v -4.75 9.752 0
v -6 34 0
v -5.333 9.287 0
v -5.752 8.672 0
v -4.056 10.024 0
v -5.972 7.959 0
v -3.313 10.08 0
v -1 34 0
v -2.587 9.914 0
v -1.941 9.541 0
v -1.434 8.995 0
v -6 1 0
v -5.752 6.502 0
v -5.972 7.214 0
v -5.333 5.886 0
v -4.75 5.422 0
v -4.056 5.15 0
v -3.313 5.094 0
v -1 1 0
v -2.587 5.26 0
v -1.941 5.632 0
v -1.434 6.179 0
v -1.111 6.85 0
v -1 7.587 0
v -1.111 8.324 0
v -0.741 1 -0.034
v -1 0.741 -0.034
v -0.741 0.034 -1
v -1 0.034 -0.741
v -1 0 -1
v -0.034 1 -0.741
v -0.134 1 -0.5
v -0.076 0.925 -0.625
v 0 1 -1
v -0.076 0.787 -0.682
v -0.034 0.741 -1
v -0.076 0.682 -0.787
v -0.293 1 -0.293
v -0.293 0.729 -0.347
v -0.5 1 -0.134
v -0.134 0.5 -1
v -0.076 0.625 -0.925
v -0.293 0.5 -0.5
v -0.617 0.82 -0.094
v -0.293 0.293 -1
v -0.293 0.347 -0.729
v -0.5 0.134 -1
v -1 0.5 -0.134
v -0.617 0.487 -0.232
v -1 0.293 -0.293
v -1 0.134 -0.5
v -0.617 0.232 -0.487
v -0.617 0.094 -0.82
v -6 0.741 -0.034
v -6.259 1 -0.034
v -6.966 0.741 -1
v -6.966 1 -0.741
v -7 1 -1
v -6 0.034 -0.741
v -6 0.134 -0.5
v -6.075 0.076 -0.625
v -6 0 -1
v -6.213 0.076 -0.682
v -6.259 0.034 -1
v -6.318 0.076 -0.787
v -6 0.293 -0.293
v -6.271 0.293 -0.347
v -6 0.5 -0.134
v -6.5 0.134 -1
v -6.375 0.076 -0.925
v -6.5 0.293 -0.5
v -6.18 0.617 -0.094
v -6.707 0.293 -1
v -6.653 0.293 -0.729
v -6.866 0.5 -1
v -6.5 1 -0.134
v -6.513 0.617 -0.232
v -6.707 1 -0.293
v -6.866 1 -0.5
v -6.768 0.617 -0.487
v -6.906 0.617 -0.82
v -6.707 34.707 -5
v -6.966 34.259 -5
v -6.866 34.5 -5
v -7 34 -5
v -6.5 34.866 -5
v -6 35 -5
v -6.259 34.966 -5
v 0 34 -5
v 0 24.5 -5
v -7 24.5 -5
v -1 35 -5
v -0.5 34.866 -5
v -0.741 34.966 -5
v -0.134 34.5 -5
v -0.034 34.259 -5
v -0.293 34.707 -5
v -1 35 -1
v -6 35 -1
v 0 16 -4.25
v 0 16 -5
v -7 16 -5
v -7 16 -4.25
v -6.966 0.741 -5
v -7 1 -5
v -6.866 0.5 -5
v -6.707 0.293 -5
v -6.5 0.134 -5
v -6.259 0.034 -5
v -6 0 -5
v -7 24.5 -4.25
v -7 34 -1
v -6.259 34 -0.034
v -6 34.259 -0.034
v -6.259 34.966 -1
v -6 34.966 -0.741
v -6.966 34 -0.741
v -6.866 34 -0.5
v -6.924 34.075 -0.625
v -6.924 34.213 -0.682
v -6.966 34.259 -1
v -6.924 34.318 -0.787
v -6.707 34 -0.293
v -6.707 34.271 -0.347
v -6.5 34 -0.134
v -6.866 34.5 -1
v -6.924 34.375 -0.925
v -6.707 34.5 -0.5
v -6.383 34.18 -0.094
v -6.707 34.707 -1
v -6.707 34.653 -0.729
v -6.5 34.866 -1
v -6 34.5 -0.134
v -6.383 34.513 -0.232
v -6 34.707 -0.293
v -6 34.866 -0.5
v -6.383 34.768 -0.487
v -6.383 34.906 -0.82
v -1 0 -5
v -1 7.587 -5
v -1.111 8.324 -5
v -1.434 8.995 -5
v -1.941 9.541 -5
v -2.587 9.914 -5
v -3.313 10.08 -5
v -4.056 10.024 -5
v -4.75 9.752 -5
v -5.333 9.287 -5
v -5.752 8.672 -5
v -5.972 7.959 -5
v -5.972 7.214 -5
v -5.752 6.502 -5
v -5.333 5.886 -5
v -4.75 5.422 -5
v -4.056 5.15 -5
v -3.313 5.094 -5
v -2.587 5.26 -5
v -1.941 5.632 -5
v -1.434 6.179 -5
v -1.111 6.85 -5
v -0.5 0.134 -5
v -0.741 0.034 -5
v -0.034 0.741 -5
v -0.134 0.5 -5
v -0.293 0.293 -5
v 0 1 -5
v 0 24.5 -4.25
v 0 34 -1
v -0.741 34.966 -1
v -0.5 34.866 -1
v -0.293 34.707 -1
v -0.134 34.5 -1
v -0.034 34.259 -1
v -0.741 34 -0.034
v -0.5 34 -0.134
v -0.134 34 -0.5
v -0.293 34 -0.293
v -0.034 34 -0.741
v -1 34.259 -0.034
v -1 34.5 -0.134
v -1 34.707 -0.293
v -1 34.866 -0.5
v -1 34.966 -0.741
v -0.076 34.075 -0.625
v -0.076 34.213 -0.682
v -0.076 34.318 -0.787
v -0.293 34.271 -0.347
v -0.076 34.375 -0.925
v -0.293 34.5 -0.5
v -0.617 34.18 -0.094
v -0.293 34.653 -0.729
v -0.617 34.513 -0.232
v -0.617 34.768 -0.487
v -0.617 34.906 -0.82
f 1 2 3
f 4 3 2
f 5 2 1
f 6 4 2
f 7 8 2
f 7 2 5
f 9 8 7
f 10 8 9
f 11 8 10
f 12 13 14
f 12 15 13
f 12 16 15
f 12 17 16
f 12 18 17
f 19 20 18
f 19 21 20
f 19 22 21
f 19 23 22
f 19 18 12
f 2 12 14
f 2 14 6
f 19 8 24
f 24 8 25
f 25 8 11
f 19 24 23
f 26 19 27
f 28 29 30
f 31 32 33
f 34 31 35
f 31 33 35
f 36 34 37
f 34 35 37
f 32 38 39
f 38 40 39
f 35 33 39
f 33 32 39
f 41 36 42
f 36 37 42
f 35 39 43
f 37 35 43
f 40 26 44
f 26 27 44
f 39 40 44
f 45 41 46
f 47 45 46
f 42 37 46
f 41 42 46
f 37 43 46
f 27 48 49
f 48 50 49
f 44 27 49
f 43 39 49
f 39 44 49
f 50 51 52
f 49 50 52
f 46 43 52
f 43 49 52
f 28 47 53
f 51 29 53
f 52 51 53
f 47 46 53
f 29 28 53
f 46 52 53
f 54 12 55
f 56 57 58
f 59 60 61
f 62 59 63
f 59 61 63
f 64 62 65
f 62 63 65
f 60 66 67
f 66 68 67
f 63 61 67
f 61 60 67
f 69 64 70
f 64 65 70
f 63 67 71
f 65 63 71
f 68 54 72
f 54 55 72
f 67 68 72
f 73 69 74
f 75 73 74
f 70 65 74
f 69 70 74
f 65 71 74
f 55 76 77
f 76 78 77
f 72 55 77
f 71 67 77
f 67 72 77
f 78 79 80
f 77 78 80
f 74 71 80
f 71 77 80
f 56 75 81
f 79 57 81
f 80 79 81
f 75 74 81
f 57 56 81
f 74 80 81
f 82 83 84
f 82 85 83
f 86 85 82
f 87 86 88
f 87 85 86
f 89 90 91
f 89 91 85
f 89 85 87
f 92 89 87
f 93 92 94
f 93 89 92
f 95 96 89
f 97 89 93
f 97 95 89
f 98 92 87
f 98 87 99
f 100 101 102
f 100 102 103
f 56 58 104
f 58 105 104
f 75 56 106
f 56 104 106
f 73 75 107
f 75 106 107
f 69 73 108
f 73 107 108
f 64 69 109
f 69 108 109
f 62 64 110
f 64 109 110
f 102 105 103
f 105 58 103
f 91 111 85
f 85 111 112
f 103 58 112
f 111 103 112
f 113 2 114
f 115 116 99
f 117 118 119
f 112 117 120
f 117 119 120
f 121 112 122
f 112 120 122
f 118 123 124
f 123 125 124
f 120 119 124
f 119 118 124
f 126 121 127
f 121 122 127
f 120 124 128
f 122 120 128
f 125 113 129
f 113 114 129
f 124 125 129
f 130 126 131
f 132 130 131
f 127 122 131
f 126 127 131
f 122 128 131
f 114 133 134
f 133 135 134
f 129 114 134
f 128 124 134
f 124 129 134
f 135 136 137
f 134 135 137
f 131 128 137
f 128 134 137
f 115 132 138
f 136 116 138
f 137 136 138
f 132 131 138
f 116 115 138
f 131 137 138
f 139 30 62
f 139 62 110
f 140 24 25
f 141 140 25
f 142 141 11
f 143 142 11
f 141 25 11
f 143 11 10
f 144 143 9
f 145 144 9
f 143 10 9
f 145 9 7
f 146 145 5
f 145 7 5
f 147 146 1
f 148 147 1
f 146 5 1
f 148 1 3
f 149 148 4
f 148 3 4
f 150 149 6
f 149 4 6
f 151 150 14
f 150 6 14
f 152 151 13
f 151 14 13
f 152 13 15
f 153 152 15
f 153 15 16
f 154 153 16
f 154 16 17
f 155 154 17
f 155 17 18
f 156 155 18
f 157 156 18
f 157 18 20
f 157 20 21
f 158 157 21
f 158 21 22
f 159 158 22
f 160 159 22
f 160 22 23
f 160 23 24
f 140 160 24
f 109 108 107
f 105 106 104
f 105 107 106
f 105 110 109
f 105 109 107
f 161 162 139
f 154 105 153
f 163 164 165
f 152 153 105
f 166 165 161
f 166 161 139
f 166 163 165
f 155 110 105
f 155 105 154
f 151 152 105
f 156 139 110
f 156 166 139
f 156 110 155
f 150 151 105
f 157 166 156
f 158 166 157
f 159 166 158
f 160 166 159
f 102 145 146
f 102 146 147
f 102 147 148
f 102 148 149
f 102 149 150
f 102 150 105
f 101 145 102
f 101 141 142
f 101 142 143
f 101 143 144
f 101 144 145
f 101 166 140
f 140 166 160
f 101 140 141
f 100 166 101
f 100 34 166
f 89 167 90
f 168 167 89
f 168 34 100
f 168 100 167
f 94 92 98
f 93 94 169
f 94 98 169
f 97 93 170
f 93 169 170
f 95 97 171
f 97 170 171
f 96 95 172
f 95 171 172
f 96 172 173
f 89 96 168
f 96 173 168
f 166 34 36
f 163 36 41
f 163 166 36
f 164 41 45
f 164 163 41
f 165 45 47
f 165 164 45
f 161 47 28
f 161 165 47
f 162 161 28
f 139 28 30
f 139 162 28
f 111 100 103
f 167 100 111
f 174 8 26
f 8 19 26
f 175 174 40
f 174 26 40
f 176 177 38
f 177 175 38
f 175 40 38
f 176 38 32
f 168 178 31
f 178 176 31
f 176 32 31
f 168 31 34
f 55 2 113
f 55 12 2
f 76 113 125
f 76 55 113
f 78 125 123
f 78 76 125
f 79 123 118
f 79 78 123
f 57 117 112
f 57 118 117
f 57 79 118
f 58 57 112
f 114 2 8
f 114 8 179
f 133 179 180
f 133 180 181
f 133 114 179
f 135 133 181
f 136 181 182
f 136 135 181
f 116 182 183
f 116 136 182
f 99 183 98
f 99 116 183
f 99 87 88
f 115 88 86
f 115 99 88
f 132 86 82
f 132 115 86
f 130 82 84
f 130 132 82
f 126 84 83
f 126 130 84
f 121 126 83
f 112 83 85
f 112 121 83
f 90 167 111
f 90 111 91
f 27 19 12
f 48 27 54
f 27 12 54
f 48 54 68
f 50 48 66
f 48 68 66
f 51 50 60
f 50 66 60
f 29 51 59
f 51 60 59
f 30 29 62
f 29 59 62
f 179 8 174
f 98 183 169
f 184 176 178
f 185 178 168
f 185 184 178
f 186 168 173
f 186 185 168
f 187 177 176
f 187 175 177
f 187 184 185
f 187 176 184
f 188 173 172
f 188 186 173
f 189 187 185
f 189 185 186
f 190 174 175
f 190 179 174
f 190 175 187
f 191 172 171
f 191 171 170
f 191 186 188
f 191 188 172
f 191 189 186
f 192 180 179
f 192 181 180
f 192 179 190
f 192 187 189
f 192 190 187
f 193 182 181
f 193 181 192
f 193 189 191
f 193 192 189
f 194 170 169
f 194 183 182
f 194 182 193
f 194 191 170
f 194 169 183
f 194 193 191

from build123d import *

# Parameters (mm, degrees)
F1_DEPTH = 7
F2_R     = 2.5
F3_DEPTH = 5.001
F4_R     = 0.99999


# Not quite as in the source:
# - a fillet or chamfer is up to 0.001 mm smaller than in the source, because OpenCascade refuses the exact size


with BuildPart() as f1:
    # F0 (on Right) → F1 (new body)
    with BuildSketch(Plane.YZ):
        Polygon((35, 0), (0, 0), (0, -5), (16, -5), (16, -4.25), (24.5, -4.25), (24.5, -5), (35, -5), align=None)
    extrude(amount=-F1_DEPTH)

    # F2 (on face) → F3 (cut, through all)
    with BuildSketch(Plane.XY):
        with Locations((-3.5, 7.5868815184)):
            Circle(F2_R)
    extrude(amount=-F3_DEPTH, mode=Mode.SUBTRACT)

    # F4 (radius 1 in the source; OpenCascade refuses exactly that, so slightly less here)
    f4_edges = [f1.edges().sort_by_distance(p)[0] for p in [
        (-3.5, 35, 0),
        (-7, 17.5, 0),
        (-3.5, 0, 0),
        (0, 17.5, 0),
        (0, 0, -2.5),
        (0, 35, -2.5),
        (-7, 35, -2.5),
        (-7, 0, -2.5),
    ]]
    fillet(f4_edges, radius=F4_R)


solid = f1.part
